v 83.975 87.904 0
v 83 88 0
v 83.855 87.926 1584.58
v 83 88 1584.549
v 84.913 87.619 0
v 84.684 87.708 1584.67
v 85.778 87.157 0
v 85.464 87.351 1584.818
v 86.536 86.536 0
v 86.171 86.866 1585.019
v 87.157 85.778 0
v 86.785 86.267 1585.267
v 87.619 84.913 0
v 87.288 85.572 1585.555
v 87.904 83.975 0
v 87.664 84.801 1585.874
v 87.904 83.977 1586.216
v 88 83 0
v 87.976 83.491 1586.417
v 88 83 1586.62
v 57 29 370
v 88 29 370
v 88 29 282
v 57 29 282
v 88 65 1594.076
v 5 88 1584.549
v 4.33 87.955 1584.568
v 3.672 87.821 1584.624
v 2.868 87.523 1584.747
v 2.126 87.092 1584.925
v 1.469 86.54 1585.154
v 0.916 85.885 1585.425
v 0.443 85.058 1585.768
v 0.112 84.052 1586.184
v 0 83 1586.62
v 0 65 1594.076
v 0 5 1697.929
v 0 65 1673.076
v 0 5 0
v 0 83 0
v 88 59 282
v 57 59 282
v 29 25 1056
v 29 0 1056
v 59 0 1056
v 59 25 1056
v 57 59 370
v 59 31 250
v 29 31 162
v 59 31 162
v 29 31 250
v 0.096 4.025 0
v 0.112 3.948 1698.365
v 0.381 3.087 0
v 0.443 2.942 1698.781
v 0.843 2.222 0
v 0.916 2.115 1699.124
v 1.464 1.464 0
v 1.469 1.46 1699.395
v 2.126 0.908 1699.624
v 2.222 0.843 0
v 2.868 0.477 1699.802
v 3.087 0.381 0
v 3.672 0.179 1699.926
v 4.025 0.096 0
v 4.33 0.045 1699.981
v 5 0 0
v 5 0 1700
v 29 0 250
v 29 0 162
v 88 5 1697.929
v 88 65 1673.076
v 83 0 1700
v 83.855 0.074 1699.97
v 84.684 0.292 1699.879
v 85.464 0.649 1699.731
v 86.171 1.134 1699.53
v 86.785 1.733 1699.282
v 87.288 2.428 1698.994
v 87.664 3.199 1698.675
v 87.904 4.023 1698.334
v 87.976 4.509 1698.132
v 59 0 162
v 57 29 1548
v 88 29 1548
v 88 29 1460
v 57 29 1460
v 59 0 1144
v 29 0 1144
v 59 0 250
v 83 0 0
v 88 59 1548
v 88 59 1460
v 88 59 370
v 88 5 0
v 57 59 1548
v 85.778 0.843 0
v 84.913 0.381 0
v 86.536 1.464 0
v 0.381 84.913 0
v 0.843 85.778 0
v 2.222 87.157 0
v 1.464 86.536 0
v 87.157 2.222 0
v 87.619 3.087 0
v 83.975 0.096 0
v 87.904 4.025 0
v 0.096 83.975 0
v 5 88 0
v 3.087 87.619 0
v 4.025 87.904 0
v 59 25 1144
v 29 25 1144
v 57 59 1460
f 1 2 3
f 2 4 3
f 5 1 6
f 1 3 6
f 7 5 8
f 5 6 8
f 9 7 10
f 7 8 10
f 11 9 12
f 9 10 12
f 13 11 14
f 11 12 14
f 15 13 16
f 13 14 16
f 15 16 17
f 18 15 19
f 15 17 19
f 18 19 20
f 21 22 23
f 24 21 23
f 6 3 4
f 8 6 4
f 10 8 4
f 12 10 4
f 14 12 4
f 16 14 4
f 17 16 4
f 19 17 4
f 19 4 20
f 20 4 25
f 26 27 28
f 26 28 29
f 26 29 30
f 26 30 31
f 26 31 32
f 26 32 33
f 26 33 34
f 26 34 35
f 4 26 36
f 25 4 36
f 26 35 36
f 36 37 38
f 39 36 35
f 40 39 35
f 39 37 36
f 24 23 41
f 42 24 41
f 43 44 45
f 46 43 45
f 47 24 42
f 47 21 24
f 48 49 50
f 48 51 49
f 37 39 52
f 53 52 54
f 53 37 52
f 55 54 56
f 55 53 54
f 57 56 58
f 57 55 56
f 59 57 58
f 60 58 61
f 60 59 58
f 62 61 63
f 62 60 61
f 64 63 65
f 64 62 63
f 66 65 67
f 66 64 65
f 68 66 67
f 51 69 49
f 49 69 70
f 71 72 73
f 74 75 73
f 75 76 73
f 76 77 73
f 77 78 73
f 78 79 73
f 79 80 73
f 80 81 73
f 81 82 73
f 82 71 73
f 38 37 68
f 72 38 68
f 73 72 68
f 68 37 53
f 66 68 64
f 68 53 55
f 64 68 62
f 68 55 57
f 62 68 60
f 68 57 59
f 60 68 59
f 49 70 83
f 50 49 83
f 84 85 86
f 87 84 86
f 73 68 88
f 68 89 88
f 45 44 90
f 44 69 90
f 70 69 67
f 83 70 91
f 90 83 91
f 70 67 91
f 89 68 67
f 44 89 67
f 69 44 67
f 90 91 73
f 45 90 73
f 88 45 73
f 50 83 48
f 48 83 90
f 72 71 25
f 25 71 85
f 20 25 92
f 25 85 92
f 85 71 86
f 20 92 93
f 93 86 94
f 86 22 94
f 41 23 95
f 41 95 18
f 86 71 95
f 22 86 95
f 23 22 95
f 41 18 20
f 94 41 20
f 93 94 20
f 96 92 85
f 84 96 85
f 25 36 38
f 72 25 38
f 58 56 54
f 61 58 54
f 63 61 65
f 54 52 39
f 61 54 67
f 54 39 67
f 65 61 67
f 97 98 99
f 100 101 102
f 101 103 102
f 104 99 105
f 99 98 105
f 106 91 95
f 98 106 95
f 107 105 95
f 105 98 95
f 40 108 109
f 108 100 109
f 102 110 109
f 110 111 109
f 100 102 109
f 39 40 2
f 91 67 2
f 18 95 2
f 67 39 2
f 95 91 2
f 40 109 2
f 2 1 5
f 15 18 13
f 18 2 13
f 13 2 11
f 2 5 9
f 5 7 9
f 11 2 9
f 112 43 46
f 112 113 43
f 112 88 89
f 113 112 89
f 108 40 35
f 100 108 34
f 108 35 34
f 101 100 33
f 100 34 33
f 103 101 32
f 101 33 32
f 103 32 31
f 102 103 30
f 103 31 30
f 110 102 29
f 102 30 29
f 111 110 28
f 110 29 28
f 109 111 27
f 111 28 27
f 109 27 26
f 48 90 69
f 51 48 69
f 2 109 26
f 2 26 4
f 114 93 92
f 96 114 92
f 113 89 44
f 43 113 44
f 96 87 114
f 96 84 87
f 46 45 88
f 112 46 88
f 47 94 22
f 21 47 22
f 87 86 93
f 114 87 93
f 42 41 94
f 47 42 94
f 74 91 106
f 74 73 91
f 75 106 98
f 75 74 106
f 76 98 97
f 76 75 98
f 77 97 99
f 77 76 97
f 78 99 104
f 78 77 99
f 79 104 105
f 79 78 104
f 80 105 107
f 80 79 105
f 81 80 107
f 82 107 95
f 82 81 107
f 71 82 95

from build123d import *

# Parameters (mm, degrees)
F0_W      = 88
F0_H      = 88
F1_DEPTH  = 1700
F3_DEPTH  = 88.001
F5_DEPTH  = 88.001
F7_DEPTH  = 31
F9_DEPTH  = 31
F11_DEPTH = 31
F13_DEPTH = 25.0000003725
F14_R     = 5


with BuildPart() as f1:
    # F0 (on Top) → F1 (new body)
    with BuildSketch(Plane.XY):
        with Locations((44, 44)):
            Rectangle(F0_W, F0_H)
    extrude(amount=F1_DEPTH)

    # F2 (on face) → F3 (cut, through all)
    with BuildSketch(Plane(origin=(0, 0, 0), x_dir=(0, -1, 0), z_dir=(-1, 0, 0))):
        Polygon((-88, 1663.5492065112), (0, 1700), (-88, 1700), align=None)
    extrude(amount=-F3_DEPTH, mode=Mode.SUBTRACT)

    # F4 (on face) → F5 (cut, through all)
    with BuildSketch(Plane(origin=(0, 0, 0), x_dir=(0, -1, 0), z_dir=(-1, 0, 0))):
        Polygon((-65, 1594.0761184457), (-65, 1673.0761184457), (-88, 1663.5492065112), (-88, 1584.5492065112), align=None)
    extrude(amount=-F5_DEPTH, mode=Mode.SUBTRACT)

    # F6 (on face) → F7 (cut)
    with BuildSketch(Plane.YZ.offset(88)):
        Polygon((29, 282), (44, 282), (59, 282), (59, 370), (29, 370), align=None)
    extrude(amount=-F7_DEPTH, mode=Mode.SUBTRACT)

    # F8 (on face) → F9 (cut)
    with BuildSketch(Plane.YZ.offset(88)):
        Polygon((29, 1460), (44, 1460), (59, 1460), (59, 1548), (29, 1548), align=None)
    extrude(amount=-F9_DEPTH, mode=Mode.SUBTRACT)

    # F10 (on face) → F11 (cut)
    with BuildSketch(Plane.XZ):
        Polygon((29, 162), (44, 162), (59, 162), (59, 250), (29, 250), align=None)
    extrude(amount=-F11_DEPTH, mode=Mode.SUBTRACT)

    # F12 (on face) → F13 (cut)
    with BuildSketch(Plane.XZ):
        Polygon((29, 1056), (44, 1056), (59, 1056), (59, 1144), (29, 1144), align=None)
    extrude(amount=-F13_DEPTH, mode=Mode.SUBTRACT)

    # F14
    f14_edges = [f1.edges().sort_by_distance(p)[0] for p in [
        (88, 0, 850),
        (0, 0, 850),
        (88, 88, 792.274603),
        (0, 88, 792.274603),
    ]]
    fillet(f14_edges, radius=F14_R)


solid = f1.part
